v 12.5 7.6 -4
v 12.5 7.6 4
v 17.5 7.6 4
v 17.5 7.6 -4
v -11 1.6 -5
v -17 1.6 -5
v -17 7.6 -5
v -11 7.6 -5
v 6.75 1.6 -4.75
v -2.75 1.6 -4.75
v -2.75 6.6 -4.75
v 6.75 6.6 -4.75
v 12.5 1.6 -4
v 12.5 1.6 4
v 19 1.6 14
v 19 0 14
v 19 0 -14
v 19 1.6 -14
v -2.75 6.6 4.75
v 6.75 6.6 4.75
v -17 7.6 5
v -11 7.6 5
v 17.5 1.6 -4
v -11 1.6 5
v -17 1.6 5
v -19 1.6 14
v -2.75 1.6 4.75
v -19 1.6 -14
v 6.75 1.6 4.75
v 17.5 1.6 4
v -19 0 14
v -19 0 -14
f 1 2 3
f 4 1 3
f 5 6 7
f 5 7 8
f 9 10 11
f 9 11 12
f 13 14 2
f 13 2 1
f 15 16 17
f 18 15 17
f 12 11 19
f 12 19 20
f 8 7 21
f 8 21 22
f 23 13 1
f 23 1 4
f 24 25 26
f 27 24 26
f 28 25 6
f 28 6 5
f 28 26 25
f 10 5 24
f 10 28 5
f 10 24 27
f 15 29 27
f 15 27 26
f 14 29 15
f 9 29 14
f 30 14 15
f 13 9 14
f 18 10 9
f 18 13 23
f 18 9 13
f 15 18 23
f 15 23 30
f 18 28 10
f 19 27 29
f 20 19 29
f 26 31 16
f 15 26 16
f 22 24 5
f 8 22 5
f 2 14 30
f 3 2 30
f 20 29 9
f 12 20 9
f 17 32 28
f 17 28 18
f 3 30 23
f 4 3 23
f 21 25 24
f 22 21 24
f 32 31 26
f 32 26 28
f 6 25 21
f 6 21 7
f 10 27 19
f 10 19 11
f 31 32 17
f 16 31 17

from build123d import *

# Parameters (mm, degrees)
SKETCH1_W             = 38
SKETCH1_H             = 28
BOARD_DEPTH           = 1.6
PROBE_CONNECTOR_START = 1.6
SKETCH2_W             = 6
SKETCH2_H             = 10
PROBE_CONNECTOR_DEPTH = 6
SIGNAL_HEADER_START   = 1.6
SKETCH3_W             = 5
SKETCH3_H             = 8
SIGNAL_HEADER_DEPTH   = 6
TRIM_POT_START        = 1.6
SKETCH4_W             = 9.5
SKETCH4_H             = 9.5
TRIM_POT_DEPTH        = 5


with BuildPart() as part:
    # Sketch1 → Board (new body)
    with BuildSketch(Plane(origin=(0, 0, 0), x_dir=(1, 0, 0), z_dir=(0, 1, 0))):
        Rectangle(SKETCH1_W, SKETCH1_H)
    extrude(amount=BOARD_DEPTH)

    # Sketch2 → Probe_Connector (add)
    with BuildSketch(Plane(origin=(0, 0, 0), x_dir=(1, 0, 0), z_dir=(0, 1, 0)).offset(PROBE_CONNECTOR_START)):
        with Locations((-14, 0)):
            Rectangle(SKETCH2_W, SKETCH2_H)
    extrude(amount=PROBE_CONNECTOR_DEPTH)

    # Sketch3 → Signal_Header (add)
    with BuildSketch(Plane(origin=(0, 0, 0), x_dir=(1, 0, 0), z_dir=(0, 1, 0)).offset(SIGNAL_HEADER_START)):
        with Locations((15, 0)):
            Rectangle(SKETCH3_W, SKETCH3_H)
    extrude(amount=SIGNAL_HEADER_DEPTH)

    # Sketch4 → Trim_Pot (add)
    with BuildSketch(Plane(origin=(0, 0, 0), x_dir=(1, 0, 0), z_dir=(0, 1, 0)).offset(TRIM_POT_START)):
        with Locations((2, 0)):
            Rectangle(SKETCH4_W, SKETCH4_H)
    extrude(amount=TRIM_POT_DEPTH)


solid = part.part
